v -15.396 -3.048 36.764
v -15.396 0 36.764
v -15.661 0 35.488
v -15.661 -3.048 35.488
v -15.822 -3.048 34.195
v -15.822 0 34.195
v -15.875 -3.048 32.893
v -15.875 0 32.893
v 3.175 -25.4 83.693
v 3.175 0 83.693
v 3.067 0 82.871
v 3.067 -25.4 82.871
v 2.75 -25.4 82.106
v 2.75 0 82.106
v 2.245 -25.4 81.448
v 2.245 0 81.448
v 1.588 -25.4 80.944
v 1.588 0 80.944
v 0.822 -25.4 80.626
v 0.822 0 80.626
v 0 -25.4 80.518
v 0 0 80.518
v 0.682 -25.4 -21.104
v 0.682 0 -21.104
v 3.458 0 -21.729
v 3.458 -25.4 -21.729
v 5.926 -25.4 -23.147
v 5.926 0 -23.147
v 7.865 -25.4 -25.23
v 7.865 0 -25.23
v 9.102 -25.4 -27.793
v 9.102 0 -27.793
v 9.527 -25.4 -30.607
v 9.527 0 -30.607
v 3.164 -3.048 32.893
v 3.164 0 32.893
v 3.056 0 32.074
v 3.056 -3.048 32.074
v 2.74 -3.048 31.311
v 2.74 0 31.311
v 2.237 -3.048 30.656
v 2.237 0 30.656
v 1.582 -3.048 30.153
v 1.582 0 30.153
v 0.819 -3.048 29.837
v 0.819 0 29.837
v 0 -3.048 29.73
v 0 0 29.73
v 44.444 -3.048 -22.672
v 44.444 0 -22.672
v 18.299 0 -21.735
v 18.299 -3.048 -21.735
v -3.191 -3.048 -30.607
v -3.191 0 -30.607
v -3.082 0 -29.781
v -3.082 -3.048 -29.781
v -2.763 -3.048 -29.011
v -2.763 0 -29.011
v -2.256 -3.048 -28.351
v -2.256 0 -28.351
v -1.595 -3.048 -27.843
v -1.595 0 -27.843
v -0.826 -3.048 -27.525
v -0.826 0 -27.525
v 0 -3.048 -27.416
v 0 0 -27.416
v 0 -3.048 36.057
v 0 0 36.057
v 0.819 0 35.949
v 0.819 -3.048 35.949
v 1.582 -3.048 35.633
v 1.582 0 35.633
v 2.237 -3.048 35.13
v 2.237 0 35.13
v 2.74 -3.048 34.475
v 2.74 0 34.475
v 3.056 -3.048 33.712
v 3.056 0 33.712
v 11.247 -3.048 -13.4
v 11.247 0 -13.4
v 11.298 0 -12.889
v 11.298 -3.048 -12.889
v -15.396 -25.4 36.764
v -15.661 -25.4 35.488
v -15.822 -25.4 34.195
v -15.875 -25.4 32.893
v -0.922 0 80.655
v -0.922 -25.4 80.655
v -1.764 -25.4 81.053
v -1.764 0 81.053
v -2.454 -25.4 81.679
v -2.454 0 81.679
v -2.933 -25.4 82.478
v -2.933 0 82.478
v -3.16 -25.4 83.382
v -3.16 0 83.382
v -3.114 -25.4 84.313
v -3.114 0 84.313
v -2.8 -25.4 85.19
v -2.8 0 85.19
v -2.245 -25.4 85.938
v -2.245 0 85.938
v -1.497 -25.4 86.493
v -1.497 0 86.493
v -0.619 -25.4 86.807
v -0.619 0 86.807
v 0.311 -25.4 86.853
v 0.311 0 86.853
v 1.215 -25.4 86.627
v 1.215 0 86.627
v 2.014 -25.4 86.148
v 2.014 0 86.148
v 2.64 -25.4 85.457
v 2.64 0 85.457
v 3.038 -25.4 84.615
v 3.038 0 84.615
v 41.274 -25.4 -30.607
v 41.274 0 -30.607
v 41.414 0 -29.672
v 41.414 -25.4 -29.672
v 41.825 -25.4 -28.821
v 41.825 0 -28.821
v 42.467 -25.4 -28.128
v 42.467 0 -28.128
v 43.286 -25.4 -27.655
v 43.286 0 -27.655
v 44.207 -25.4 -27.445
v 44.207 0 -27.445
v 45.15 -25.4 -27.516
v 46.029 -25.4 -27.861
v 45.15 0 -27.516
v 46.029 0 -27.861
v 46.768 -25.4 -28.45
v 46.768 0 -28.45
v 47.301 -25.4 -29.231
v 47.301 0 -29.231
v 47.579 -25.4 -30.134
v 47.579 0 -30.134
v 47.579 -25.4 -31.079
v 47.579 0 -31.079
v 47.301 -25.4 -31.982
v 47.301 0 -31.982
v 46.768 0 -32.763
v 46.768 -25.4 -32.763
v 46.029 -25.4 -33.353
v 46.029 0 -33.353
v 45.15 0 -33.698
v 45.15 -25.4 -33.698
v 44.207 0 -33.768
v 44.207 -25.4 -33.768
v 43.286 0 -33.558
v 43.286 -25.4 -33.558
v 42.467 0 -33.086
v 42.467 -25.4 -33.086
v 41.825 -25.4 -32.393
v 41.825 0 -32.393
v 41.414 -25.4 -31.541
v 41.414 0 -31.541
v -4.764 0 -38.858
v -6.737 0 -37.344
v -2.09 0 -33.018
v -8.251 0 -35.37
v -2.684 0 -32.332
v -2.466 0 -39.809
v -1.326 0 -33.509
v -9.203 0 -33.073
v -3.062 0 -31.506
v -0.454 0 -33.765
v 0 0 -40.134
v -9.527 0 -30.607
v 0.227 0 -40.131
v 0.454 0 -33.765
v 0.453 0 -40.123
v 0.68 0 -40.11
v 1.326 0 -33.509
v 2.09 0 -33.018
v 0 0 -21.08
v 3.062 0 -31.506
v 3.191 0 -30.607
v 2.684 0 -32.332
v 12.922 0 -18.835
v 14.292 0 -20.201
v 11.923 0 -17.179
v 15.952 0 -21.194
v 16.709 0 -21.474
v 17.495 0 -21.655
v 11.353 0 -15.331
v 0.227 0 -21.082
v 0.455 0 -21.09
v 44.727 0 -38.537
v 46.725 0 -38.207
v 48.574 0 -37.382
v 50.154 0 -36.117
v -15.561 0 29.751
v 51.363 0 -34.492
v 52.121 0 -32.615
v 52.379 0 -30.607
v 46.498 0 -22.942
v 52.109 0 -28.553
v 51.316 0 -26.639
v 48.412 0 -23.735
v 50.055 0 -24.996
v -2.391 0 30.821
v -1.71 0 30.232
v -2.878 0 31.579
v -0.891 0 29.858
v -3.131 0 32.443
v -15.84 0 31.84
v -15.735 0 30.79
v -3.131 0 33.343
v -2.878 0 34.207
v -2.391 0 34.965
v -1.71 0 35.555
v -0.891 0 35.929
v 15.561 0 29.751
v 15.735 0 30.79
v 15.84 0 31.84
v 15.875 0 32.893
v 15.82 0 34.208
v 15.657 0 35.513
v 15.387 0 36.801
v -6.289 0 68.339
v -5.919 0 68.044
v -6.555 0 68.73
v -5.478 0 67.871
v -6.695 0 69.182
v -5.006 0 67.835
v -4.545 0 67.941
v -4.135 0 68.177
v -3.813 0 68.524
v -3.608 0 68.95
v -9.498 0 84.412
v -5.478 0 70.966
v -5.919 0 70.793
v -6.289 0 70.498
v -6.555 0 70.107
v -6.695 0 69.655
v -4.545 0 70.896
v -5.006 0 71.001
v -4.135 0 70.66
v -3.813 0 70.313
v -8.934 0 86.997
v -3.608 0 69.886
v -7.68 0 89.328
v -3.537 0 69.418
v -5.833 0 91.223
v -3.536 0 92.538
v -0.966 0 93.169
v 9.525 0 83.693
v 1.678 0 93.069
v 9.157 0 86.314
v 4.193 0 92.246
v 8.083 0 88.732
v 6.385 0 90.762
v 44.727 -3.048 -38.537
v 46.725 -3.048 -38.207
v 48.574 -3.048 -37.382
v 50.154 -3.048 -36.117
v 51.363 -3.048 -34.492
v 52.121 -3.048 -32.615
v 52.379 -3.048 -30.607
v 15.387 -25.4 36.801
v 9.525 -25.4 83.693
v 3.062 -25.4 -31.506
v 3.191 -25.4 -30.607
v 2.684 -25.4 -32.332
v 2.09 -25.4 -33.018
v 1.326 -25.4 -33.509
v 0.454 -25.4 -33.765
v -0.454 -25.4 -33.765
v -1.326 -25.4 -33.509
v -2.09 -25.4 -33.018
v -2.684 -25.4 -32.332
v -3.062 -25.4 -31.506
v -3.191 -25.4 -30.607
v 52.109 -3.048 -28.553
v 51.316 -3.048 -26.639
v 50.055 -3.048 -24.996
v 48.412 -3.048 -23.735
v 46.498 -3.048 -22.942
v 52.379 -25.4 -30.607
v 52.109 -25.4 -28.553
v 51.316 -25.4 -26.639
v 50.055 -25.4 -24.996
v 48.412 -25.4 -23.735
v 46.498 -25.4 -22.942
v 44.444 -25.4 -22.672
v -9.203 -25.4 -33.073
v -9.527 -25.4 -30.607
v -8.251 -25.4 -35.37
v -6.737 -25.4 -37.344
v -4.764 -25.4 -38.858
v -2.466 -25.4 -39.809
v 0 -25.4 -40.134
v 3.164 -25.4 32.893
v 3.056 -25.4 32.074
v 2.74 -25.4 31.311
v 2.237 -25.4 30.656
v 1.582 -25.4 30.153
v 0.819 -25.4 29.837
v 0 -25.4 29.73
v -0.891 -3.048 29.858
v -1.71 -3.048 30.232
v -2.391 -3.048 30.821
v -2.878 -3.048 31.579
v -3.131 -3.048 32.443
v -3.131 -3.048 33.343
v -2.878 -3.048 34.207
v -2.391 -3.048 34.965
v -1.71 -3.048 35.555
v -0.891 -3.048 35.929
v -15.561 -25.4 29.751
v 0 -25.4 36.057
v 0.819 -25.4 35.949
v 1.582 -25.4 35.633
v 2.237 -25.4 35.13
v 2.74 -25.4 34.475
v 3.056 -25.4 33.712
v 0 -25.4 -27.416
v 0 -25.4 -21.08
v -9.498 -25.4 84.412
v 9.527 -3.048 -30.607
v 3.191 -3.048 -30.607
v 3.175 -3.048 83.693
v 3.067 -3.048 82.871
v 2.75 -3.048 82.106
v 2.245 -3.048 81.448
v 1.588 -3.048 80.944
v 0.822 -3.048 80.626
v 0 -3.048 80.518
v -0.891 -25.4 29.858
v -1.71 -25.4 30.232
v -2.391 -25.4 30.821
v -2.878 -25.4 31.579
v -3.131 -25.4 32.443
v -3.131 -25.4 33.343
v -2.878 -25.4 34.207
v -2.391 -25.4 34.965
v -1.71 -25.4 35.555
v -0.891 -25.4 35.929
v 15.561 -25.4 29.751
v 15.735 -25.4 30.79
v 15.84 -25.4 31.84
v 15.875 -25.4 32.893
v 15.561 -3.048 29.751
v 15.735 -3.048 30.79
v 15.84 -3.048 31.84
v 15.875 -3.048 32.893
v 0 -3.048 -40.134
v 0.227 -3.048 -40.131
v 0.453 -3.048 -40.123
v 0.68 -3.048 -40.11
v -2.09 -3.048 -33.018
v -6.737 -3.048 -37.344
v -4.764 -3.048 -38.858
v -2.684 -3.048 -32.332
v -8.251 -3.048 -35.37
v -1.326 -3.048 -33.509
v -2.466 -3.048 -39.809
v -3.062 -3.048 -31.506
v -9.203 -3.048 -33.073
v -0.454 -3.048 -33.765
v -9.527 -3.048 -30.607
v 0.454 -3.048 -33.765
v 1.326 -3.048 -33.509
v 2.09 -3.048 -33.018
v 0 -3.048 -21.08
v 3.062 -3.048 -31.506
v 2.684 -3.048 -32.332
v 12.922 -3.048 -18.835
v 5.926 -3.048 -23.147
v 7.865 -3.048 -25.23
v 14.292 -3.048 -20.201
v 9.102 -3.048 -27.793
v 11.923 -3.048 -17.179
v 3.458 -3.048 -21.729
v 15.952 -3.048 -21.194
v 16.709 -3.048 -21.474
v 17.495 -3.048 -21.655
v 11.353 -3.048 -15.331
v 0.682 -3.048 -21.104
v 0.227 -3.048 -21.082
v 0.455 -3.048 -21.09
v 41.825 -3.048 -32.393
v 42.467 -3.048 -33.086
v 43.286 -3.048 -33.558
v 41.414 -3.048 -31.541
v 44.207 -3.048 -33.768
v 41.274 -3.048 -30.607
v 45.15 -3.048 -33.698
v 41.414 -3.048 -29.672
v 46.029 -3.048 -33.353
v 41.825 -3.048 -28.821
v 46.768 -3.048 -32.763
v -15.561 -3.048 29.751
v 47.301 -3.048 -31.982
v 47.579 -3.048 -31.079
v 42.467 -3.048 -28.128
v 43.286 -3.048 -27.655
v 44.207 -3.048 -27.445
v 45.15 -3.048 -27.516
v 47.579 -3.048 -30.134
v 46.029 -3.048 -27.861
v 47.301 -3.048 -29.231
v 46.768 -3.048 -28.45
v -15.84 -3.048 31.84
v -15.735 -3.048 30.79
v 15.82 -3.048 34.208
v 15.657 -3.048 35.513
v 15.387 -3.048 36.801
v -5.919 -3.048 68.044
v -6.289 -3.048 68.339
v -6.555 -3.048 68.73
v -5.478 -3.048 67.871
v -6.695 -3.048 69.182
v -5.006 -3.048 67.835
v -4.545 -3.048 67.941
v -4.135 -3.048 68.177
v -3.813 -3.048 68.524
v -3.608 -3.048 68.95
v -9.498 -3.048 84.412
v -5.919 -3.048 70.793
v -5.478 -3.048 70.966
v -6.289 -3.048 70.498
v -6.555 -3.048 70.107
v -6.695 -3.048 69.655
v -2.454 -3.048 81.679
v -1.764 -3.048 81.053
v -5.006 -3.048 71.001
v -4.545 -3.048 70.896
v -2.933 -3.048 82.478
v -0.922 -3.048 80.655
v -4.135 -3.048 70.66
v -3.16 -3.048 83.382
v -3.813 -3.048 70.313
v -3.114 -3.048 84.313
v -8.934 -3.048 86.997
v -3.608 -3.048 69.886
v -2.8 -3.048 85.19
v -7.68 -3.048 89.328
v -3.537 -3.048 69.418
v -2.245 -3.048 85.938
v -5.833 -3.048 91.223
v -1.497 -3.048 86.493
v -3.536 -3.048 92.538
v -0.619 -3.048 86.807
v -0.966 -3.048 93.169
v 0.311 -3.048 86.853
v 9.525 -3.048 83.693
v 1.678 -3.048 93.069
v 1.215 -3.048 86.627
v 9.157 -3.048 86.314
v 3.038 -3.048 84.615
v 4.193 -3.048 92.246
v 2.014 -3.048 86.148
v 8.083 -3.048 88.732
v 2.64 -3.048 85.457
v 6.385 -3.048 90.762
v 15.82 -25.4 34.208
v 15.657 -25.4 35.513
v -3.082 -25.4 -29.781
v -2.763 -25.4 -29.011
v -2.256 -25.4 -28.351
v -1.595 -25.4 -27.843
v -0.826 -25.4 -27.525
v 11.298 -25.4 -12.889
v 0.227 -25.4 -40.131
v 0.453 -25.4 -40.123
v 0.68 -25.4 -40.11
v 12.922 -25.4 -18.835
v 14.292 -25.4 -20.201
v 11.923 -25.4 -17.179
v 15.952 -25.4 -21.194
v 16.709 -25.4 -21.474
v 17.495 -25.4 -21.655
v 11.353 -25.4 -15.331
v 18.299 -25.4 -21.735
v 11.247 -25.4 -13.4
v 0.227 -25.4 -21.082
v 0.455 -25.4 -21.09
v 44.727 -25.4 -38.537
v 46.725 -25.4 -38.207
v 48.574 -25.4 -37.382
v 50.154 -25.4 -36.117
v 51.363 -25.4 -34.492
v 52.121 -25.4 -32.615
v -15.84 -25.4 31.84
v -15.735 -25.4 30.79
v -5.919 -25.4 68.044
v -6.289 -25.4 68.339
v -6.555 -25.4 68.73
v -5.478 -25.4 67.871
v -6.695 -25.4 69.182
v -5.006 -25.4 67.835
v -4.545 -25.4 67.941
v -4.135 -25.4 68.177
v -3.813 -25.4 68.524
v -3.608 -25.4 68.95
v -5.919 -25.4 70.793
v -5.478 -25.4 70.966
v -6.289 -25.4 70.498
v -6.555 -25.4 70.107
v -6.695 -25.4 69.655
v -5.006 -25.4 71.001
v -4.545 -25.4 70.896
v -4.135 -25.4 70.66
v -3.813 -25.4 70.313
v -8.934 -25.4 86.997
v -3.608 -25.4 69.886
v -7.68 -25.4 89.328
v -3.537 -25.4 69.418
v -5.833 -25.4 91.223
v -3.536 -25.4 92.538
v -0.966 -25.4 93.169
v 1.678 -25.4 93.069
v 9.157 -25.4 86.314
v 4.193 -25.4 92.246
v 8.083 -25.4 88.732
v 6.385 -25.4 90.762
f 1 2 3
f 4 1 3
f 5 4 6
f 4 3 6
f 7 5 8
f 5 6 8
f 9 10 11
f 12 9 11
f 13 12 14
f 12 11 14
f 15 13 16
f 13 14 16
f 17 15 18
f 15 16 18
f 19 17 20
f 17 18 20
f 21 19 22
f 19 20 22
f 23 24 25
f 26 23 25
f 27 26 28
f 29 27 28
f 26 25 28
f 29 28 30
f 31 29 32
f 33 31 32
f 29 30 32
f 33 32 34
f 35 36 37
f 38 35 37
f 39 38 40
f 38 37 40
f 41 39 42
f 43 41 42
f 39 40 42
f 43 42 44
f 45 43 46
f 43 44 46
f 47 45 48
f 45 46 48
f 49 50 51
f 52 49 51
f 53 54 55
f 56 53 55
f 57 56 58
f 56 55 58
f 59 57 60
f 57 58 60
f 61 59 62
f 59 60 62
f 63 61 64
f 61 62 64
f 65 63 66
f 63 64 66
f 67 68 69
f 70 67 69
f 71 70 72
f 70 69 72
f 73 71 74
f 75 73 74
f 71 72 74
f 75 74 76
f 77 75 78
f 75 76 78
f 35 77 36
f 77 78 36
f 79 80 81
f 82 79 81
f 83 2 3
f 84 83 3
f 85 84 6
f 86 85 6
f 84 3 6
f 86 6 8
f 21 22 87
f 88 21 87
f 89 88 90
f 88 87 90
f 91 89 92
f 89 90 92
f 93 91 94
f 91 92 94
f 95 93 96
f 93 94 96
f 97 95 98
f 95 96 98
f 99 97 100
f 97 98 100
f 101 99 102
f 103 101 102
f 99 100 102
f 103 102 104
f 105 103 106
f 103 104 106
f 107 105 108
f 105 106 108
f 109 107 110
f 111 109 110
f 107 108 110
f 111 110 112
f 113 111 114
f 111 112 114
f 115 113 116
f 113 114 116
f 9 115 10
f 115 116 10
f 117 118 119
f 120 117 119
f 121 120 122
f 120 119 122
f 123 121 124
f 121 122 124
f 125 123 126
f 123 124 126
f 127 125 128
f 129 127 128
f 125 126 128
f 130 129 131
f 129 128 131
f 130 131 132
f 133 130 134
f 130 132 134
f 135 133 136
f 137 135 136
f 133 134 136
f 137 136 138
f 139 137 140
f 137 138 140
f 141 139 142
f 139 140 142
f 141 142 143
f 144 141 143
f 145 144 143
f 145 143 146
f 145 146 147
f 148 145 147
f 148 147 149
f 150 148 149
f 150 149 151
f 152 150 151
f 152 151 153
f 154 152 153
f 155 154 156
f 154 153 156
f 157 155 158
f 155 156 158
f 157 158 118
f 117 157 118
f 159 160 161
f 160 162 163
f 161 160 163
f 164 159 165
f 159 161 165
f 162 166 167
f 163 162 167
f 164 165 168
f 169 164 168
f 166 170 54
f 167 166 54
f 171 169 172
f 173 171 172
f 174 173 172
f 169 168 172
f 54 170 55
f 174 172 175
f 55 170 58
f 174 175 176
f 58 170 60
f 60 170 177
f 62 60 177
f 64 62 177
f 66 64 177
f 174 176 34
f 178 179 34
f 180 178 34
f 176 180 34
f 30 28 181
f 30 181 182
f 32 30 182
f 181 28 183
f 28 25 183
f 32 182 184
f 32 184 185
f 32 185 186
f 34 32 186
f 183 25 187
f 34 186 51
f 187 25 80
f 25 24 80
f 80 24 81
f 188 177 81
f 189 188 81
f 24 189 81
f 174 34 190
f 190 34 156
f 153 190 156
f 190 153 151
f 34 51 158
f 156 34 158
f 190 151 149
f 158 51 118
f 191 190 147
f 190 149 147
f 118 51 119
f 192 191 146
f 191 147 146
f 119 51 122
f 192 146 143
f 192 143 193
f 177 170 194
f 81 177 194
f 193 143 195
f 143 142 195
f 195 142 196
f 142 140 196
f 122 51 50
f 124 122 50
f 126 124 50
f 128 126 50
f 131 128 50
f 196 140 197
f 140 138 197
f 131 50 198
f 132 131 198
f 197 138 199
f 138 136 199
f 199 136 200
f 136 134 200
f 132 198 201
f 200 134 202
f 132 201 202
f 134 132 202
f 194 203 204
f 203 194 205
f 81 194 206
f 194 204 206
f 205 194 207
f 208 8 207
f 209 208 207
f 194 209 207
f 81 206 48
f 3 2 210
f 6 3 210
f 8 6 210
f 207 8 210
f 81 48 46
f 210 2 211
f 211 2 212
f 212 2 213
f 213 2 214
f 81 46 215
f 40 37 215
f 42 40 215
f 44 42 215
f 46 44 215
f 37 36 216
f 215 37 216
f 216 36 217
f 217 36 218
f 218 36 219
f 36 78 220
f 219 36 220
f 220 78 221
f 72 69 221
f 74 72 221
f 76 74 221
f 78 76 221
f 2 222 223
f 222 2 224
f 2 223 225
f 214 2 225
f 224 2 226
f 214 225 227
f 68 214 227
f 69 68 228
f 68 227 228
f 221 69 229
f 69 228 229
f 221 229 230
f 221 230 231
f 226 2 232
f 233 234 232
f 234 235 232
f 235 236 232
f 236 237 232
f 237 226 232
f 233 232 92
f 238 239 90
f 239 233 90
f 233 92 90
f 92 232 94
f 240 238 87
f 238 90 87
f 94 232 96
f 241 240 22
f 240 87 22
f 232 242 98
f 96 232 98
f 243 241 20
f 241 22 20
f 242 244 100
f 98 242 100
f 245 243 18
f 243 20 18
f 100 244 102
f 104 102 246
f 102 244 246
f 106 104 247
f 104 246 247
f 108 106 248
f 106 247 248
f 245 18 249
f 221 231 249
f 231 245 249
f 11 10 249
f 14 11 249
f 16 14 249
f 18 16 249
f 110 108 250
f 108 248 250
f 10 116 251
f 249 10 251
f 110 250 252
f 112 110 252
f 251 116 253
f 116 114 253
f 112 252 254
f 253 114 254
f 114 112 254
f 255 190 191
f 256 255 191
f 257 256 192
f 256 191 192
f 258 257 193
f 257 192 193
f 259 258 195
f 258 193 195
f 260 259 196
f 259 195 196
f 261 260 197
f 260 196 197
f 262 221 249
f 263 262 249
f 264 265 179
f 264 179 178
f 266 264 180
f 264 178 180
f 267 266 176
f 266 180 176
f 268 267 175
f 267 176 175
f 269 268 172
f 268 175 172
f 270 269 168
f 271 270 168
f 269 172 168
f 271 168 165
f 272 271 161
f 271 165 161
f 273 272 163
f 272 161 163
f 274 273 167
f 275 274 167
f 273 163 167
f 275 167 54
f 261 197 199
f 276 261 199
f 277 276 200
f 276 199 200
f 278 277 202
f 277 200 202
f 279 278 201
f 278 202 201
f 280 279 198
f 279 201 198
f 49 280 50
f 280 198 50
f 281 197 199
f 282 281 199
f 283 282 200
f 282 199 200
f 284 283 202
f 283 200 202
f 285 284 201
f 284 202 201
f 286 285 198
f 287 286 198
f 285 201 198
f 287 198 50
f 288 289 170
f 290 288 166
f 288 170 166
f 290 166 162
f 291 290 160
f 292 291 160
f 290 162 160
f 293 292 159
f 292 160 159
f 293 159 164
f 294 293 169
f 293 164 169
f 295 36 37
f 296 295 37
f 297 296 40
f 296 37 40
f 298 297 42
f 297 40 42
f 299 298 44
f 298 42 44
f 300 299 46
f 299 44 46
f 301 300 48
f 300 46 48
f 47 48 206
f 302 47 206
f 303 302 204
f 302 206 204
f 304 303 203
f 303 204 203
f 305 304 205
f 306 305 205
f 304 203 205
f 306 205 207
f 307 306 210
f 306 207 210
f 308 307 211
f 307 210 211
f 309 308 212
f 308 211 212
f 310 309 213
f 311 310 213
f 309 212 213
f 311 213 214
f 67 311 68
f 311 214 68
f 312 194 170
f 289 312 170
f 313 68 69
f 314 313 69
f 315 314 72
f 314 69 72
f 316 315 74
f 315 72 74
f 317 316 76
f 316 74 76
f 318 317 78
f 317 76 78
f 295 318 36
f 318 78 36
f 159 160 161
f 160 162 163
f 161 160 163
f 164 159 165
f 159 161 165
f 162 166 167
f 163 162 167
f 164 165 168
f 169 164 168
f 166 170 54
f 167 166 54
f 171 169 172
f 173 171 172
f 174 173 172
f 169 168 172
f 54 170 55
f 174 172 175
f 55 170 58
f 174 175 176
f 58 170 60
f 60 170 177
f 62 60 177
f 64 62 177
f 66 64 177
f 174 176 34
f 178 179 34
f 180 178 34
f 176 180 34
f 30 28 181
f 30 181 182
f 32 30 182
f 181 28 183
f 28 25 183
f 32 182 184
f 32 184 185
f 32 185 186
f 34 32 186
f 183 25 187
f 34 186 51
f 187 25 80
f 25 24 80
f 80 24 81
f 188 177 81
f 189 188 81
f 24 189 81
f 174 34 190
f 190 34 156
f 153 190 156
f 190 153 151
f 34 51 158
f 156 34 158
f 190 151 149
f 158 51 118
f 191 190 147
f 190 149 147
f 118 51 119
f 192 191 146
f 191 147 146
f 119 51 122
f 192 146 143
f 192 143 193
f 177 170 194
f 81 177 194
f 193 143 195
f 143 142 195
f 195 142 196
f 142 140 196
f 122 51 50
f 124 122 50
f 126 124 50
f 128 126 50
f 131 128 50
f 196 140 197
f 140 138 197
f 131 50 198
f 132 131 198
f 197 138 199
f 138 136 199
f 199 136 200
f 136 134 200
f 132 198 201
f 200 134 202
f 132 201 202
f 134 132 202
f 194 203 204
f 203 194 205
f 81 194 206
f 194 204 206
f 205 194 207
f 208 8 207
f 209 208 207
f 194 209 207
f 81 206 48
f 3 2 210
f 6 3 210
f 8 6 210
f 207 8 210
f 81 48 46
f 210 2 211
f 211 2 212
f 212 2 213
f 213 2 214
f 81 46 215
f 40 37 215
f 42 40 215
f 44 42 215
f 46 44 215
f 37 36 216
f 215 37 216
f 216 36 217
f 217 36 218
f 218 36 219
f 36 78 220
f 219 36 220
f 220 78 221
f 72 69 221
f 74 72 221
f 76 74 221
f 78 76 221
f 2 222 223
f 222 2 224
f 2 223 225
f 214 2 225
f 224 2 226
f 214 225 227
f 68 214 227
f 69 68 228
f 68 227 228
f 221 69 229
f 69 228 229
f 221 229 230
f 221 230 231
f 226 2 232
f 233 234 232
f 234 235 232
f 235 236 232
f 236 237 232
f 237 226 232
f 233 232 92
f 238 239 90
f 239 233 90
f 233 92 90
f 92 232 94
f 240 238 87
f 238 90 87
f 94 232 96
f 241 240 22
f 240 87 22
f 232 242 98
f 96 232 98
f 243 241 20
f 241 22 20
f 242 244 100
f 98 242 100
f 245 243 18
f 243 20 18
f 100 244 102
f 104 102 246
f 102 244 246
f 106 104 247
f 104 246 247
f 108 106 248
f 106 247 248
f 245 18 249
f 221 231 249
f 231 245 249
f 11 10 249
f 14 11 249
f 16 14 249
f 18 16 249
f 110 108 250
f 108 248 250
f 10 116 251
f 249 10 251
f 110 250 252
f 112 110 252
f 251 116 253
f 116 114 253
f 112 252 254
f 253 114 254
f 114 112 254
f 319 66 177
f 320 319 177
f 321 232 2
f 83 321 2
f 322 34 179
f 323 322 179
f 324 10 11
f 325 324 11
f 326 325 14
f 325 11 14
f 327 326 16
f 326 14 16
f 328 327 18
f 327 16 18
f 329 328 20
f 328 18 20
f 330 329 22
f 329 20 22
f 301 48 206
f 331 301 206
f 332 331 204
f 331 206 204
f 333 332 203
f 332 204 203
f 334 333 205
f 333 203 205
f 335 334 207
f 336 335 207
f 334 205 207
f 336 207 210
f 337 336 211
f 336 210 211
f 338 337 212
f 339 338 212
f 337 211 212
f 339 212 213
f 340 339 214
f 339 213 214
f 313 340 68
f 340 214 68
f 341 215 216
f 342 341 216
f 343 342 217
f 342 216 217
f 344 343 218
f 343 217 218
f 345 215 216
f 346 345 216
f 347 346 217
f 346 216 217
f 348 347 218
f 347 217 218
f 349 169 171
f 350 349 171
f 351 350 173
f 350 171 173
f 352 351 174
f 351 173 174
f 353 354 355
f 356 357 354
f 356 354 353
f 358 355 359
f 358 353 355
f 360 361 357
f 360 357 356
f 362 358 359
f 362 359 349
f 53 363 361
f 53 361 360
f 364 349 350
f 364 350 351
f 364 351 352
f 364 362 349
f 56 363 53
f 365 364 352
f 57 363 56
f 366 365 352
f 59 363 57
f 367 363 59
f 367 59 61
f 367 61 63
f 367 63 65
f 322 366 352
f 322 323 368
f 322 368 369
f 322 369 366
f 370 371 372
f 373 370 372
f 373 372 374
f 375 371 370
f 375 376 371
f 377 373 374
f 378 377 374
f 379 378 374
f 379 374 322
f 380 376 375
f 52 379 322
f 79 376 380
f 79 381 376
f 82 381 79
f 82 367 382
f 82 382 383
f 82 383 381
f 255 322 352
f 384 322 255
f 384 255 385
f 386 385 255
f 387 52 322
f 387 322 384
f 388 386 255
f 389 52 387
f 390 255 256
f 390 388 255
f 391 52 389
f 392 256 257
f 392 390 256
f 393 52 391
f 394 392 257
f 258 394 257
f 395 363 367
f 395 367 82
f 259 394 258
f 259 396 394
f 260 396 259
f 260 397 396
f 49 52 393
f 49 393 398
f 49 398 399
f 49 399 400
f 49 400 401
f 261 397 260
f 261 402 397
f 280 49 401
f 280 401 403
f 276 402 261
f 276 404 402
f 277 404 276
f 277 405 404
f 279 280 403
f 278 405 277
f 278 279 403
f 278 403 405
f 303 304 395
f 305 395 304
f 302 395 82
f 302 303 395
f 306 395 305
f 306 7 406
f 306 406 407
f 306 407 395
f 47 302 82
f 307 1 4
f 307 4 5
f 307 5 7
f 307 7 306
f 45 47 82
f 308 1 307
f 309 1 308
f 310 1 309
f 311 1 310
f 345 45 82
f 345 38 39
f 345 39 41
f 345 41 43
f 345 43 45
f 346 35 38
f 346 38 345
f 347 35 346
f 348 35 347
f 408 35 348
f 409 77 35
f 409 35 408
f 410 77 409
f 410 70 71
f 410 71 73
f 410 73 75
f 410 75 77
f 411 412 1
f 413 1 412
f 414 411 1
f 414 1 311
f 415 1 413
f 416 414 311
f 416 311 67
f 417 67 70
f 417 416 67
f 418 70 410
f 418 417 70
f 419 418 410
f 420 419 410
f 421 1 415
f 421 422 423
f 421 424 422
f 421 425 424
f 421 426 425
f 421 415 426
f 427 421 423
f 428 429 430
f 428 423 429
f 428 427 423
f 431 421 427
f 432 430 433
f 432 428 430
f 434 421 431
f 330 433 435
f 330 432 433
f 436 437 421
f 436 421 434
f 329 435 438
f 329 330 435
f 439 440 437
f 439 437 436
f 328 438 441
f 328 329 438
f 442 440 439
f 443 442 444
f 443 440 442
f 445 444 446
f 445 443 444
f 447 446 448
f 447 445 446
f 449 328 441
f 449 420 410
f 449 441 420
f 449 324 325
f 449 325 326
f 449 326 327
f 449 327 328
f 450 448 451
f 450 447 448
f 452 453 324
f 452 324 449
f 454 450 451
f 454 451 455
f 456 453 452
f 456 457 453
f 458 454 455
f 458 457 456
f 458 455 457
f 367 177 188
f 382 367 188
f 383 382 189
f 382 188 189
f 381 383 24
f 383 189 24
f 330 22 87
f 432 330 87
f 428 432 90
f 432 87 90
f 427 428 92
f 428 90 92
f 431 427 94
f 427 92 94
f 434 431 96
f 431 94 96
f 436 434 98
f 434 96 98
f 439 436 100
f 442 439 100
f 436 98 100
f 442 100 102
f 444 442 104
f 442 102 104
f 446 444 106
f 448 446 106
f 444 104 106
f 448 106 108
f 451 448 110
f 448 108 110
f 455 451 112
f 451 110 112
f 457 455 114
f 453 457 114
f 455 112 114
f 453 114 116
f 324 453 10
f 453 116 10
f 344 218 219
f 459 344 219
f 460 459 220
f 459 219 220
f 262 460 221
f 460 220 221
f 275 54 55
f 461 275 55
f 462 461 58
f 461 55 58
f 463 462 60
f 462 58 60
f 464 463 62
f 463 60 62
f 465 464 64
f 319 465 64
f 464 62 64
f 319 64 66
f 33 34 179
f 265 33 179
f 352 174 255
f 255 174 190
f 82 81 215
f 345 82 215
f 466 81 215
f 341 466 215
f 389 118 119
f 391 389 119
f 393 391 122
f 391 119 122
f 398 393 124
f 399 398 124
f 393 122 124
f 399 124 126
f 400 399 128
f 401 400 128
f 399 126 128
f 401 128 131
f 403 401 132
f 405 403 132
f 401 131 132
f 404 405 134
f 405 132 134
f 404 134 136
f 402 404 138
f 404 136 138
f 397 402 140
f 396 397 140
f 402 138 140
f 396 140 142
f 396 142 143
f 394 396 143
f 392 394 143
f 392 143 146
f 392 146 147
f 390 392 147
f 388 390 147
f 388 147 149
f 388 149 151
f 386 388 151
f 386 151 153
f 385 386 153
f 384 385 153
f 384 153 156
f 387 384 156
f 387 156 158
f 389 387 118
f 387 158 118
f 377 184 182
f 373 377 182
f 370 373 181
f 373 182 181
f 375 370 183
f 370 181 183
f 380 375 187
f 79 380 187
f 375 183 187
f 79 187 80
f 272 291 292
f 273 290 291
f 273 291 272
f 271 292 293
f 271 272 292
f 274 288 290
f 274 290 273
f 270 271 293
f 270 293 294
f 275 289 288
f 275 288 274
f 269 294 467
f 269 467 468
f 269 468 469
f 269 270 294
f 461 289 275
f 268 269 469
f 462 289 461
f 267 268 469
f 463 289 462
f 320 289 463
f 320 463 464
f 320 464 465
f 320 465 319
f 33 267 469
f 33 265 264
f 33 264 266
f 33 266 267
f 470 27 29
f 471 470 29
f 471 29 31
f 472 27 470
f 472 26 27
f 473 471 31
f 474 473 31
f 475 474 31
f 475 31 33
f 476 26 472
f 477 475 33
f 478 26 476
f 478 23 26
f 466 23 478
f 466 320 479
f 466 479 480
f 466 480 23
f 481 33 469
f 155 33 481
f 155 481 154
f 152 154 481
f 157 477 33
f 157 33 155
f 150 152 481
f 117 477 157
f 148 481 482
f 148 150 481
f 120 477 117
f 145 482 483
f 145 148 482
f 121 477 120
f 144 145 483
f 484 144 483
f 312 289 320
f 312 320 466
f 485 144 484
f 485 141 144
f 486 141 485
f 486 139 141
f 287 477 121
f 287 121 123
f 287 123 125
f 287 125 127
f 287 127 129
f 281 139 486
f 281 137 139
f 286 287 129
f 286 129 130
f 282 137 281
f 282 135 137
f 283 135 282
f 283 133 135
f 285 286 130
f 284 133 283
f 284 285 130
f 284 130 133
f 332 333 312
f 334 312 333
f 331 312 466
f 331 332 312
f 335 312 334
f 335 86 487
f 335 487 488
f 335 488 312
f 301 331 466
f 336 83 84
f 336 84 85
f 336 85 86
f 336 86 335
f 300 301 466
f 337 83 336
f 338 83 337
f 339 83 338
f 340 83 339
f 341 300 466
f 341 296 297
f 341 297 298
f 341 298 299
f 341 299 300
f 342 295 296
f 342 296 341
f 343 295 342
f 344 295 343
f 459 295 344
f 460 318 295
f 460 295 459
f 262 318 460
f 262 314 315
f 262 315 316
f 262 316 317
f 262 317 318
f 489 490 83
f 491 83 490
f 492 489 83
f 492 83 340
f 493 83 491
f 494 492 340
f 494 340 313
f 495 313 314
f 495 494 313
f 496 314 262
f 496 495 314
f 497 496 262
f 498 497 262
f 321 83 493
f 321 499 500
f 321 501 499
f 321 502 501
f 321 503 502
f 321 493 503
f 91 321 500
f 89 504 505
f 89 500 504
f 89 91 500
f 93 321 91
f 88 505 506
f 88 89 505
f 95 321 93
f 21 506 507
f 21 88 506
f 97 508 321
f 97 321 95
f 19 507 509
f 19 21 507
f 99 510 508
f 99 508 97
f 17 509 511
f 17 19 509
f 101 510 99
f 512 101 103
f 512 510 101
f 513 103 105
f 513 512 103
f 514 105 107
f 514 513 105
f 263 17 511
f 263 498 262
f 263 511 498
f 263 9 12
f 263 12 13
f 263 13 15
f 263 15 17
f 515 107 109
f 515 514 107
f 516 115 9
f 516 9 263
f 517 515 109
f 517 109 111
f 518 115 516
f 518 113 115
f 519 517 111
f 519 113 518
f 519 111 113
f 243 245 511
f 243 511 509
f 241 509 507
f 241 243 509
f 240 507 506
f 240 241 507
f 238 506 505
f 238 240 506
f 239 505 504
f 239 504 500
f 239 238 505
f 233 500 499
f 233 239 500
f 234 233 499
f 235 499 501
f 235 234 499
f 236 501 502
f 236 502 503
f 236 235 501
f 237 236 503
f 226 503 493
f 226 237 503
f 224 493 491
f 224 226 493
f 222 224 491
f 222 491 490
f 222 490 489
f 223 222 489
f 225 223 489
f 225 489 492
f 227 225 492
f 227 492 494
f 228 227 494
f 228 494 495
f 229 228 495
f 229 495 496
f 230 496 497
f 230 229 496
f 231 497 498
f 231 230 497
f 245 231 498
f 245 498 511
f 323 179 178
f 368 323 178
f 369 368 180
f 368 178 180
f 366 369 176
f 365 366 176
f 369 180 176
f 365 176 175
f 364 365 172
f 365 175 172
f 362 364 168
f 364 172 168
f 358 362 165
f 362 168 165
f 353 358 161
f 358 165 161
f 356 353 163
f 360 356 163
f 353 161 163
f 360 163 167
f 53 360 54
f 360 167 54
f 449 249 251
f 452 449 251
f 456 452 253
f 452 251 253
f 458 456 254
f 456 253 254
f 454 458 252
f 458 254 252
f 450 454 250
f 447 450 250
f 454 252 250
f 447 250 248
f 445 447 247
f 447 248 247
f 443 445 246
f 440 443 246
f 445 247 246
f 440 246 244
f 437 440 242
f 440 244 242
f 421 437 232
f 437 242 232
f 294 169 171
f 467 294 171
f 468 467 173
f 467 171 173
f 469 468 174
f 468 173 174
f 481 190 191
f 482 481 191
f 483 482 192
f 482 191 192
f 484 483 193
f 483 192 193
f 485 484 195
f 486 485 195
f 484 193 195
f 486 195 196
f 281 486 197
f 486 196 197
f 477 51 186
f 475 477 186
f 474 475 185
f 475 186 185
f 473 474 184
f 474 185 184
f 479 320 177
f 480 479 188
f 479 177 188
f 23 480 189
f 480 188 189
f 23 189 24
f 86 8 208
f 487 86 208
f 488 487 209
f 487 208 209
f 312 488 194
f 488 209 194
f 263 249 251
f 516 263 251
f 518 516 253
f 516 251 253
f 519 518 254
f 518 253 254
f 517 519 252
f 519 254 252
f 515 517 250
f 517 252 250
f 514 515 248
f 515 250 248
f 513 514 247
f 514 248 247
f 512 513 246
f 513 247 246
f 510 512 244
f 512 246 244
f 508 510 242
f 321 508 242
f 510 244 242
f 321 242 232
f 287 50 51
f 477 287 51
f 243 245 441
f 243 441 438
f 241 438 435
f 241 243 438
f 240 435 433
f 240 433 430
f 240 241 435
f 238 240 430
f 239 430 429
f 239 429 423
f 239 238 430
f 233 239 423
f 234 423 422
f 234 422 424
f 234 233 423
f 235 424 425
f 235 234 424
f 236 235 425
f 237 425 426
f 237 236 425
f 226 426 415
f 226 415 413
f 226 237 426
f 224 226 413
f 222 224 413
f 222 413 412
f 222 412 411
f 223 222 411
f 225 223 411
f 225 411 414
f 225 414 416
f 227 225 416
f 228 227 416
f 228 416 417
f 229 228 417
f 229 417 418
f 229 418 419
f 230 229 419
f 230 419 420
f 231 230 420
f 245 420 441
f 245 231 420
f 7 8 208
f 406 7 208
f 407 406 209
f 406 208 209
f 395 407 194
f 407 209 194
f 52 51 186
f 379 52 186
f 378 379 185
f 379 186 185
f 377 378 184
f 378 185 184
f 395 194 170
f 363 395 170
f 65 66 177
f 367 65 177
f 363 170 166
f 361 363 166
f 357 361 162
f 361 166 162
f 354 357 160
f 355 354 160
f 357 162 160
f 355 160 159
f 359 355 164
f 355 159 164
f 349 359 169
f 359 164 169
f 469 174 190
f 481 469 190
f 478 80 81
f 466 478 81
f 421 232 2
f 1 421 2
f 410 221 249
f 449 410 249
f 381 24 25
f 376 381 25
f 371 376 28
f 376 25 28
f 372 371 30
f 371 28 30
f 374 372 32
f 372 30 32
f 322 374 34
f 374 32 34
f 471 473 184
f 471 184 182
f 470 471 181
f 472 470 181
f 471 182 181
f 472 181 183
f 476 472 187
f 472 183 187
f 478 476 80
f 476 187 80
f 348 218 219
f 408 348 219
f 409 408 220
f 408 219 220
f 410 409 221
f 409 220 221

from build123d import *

# Parameters (mm, degrees)
F0_R     = 1.5875
F1_DEPTH = 25.4
F2_DEPTH = 3.048


with BuildPart() as f1:
    # F0 (on Front) → F1 (new body)
    with BuildSketch(Plane.XZ):
        with BuildLine():
            ThreePointArc((-9.4978428488, 84.4119633965), (-6.9846885975, 77.2171194998), (0, 74.1682101567))
            ThreePointArc((0, 74.1682101567), (6.7351920908, 76.9580180659), (9.525, 83.6932101567))
            ThreePointArc((9.525, 83.6932101567), (0.3596330528, 93.2114184475), (-9.4978428488, 84.4119633965))
        make_face()
        with BuildLine():
            ThreePointArc((3.175, 83.6932101567), (2.2450640303, 81.4481461264), (0, 80.5182101567))
            ThreePointArc((0, 80.5182101567), (-2.2450640303, 85.938274187), (3.175, 83.6932101567))
        make_face(mode=Mode.SUBTRACT)
        with BuildLine():
            ThreePointArc((9.525, 83.6932101567), (6.7351920908, 76.9580180659), (0, 74.1682101567))
            Line((0, 74.1682101567), (0, 69.4184101567))
            Line((0, 69.4184101567), (0, 48.7682101567))
            ThreePointArc((0, 48.7682101567), (9.7463072395, 45.4241766075), (15.3865384615, 36.8009024644))
            Line((15.3865384615, 36.8009024644), (9.525, 83.6932101567))
        make_face()
        with BuildLine():
            Line((0, 69.4184101567), (0, 74.1682101567))
            ThreePointArc((0, 74.1682101567), (-6.9846885975, 77.2171194998), (-9.4978428488, 84.4119633965))
            Line((-9.4978428488, 84.4119633965), (-15.3958589716, 36.7640177631))
            ThreePointArc((-15.3958589716, 36.7640177631), (-9.7613153378, 45.4124892045), (0, 48.7682101567))
            Line((0, 48.7682101567), (0, 69.4184101567))
        make_face()
        with Locations((-5.124937529, 69.4184101567)):
            Circle(F0_R, mode=Mode.SUBTRACT)
        with BuildLine():
            ThreePointArc((15.3865384615, 36.8009024644), (9.7463072395, 45.4241766075), (0, 48.7682101567))
            Line((0, 48.7682101567), (0, 36.0568941846))
            ThreePointArc((0, 36.0568941846), (2.2370624297, 35.1302725864), (3.1636840279, 32.8932101567))
            ThreePointArc((3.1636840279, 32.8932101567), (2.2370624297, 30.656147727), (0, 29.7295261288))
            Line((0, 29.7295261288), (0, 17.0182101567))
            ThreePointArc((0, 17.0182101567), (10.0530630624, 20.6069760688), (15.5608549399, 29.7506922904))
            Line((15.5608549399, 29.7506922904), (15.875, 32.8932101567))
            Line((15.875, 32.8932101567), (15.3865384615, 36.8009024644))
        make_face()
        with BuildLine():
            Line((0, 36.0568941846), (0, 48.7682101567))
            ThreePointArc((0, 48.7682101567), (-9.7613153378, 45.4124892045), (-15.3958589716, 36.7640177631))
            Line((-15.3958589716, 36.7640177631), (-15.875, 32.8932101567))
            Line((-15.875, 32.8932101567), (-15.5608549399, 29.7506922904))
            ThreePointArc((-15.5608549399, 29.7506922904), (-10.0530630624, 20.6069760688), (0, 17.0182101567))
            Line((0, 17.0182101567), (0, 29.7295261288))
            ThreePointArc((0, 29.7295261288), (-3.1636840279, 32.8932101567), (0, 36.0568941846))
        make_face()
        with BuildLine():
            Line((-15.875, 32.8932101567), (-15.3958589716, 36.7640177631))
            ThreePointArc((-15.3958589716, 36.7640177631), (-15.7547593789, 34.8433849983), (-15.875, 32.8932101567))
        make_face()
        with BuildLine():
            ThreePointArc((15.875, 32.8932101567), (15.7524112928, 34.8622615683), (15.3865384615, 36.8009024644))
            Line((15.3865384615, 36.8009024644), (15.875, 32.8932101567))
        make_face()
        with BuildLine():
            Line((-15.5608549399, 29.7506922904), (-15.875, 32.8932101567))
            ThreePointArc((-15.875, 32.8932101567), (-15.7962685019, 31.314119781), (-15.5608549399, 29.7506922904))
        make_face()
        with BuildLine():
            ThreePointArc((15.5608549399, 29.7506922904), (15.7962685019, 31.314119781), (15.875, 32.8932101567))
            Line((15.875, 32.8932101567), (15.5608549399, 29.7506922904))
        make_face()
        with BuildLine():
            ThreePointArc((0, 17.0182101567), (-10.0530630624, 20.6069760688), (-15.5608549399, 29.7506922904))
            Line((-15.5608549399, 29.7506922904), (-9.5271565935, -30.6067898433))
            ThreePointArc((-9.5271565935, -30.6067898433), (-6.7367170327, -23.8700728106), (0, -21.0796332498))
            Line((0, -21.0796332498), (0, 17.0182101567))
        make_face()
        with BuildLine():
            Line((11.2983400626, -12.8889377975), (15.5608549399, 29.7506922904))
            ThreePointArc((15.5608549399, 29.7506922904), (10.0530630624, 20.6069760688), (0, 17.0182101567))
            Line((0, 17.0182101567), (0, -21.0796332498))
            ThreePointArc((0, -21.0796332498), (0.3410737199, -21.085740454), (0.6817101619, -21.1040542366))
            ThreePointArc((0.6817101619, -21.1040542366), (6.9735741274, -24.1155667963), (9.5271565935, -30.6067898433))
            Line((9.5271565935, -30.6067898433), (36.5091171516, -30.6067898433))
            ThreePointArc((36.5091171516, -30.6067898433), (38.8332331942, -24.9958773728), (44.4441456647, -22.6717613302))
            Line((44.4441456647, -22.6717613302), (18.2985487274, -21.7351444049))
            ThreePointArc((18.2985487274, -21.7351444049), (17.0992487454, -21.5768820426), (15.9517234628, -21.1940594363))
            ThreePointArc((15.9517234628, -21.1940594363), (12.3718358169, -18.037938808), (11.2472680533, -13.3998314005))
            ThreePointArc((11.2472680533, -13.3998314005), (11.2686743647, -13.14397177), (11.2983400626, -12.8889377975))
        make_face()
        with BuildLine():
            Line((-3.1908159444, -30.6067898433), (-9.5271565935, -30.6067898433))
            ThreePointArc((-9.5271565935, -30.6067898433), (-6.7367170327, -37.343506876), (0, -40.1339464368))
            Line((0, -40.1339464368), (0.6795501516, -40.1096801588))
            ThreePointArc((0.6795501516, -40.1096801588), (6.9728363477, -37.0988054028), (9.5271565935, -30.6067898433))
            Line((9.5271565935, -30.6067898433), (3.1908159444, -30.6067898433))
            ThreePointArc((3.1908159444, -30.6067898433), (0, -33.7976057877), (-3.1908159444, -30.6067898433))
        make_face()
        with BuildLine():
            ThreePointArc((0, -21.0796332498), (-6.7367170327, -23.8700728106), (-9.5271565935, -30.6067898433))
            Line((-9.5271565935, -30.6067898433), (-3.1908159444, -30.6067898433))
            ThreePointArc((-3.1908159444, -30.6067898433), (-2.2562475918, -28.3505422515), (0, -27.4159738989))
            Line((0, -27.4159738989), (0, -21.0796332498))
        make_face()
        with BuildLine():
            Line((11.2472680533, -13.3998314005), (11.2983400626, -12.8889377975))
            ThreePointArc((11.2983400626, -12.8889377975), (11.2686743647, -13.14397177), (11.2472680533, -13.3998314005))
        make_face()
        with BuildLine():
            Line((0.6795501516, -40.1096801588), (0, -40.1339464368))
            ThreePointArc((0, -40.1339464368), (0.3399916399, -40.1278779346), (0.6795501516, -40.1096801588))
        make_face()
        with BuildLine():
            ThreePointArc((9.5271565935, -30.6067898433), (6.9728363477, -37.0988054028), (0.6795501516, -40.1096801588))
            Line((0.6795501516, -40.1096801588), (44.7273196978, -38.5367639902))
            ThreePointArc((44.7273196978, -38.5367639902), (38.9342598457, -36.3169418348), (36.5091171516, -30.6067898433))
            Line((36.5091171516, -30.6067898433), (9.5271565935, -30.6067898433))
        make_face()
        with BuildLine():
            ThreePointArc((36.5091171516, -30.6067898433), (38.9342598457, -36.3169418348), (44.7273196978, -38.5367639902))
            ThreePointArc((44.7273196978, -38.5367639902), (50.1542976561, -36.1166756623), (52.3791741778, -30.6067898433))
            ThreePointArc((52.3791741778, -30.6067898433), (50.0550581352, -24.9958773728), (44.4441456647, -22.6717613302))
            ThreePointArc((44.4441456647, -22.6717613302), (38.8332331942, -24.9958773728), (36.5091171516, -30.6067898433))
        make_face()
        with BuildLine():
            ThreePointArc((47.6147016308, -30.6067898433), (44.4441456647, -33.7773458094), (41.2735896986, -30.6067898433))
            ThreePointArc((41.2735896986, -30.6067898433), (44.4441456647, -27.4362338772), (47.6147016308, -30.6067898433))
        make_face(mode=Mode.SUBTRACT)
    extrude(amount=F1_DEPTH)


with BuildPart() as f2:
    # F0 (on Front) → F2 (new body)
    with BuildSketch(Plane.XZ):
        with BuildLine():
            ThreePointArc((-9.4978428488, 84.4119633965), (-6.9846885975, 77.2171194998), (0, 74.1682101567))
            ThreePointArc((0, 74.1682101567), (6.7351920908, 76.9580180659), (9.525, 83.6932101567))
            ThreePointArc((9.525, 83.6932101567), (0.3596330528, 93.2114184475), (-9.4978428488, 84.4119633965))
        make_face()
        with BuildLine():
            ThreePointArc((3.175, 83.6932101567), (2.2450640303, 81.4481461264), (0, 80.5182101567))
            ThreePointArc((0, 80.5182101567), (-2.2450640303, 85.938274187), (3.175, 83.6932101567))
        make_face(mode=Mode.SUBTRACT)
        with BuildLine():
            ThreePointArc((9.525, 83.6932101567), (6.7351920908, 76.9580180659), (0, 74.1682101567))
            Line((0, 74.1682101567), (0, 69.4184101567))
            Line((0, 69.4184101567), (0, 48.7682101567))
            ThreePointArc((0, 48.7682101567), (9.7463072395, 45.4241766075), (15.3865384615, 36.8009024644))
            Line((15.3865384615, 36.8009024644), (9.525, 83.6932101567))
        make_face()
        with BuildLine():
            Line((0, 69.4184101567), (0, 74.1682101567))
            ThreePointArc((0, 74.1682101567), (-6.9846885975, 77.2171194998), (-9.4978428488, 84.4119633965))
            Line((-9.4978428488, 84.4119633965), (-15.3958589716, 36.7640177631))
            ThreePointArc((-15.3958589716, 36.7640177631), (-9.7613153378, 45.4124892045), (0, 48.7682101567))
            Line((0, 48.7682101567), (0, 69.4184101567))
        make_face()
        with Locations((-5.124937529, 69.4184101567)):
            Circle(F0_R, mode=Mode.SUBTRACT)
        with BuildLine():
            ThreePointArc((15.3865384615, 36.8009024644), (9.7463072395, 45.4241766075), (0, 48.7682101567))
            Line((0, 48.7682101567), (0, 36.0568941846))
            ThreePointArc((0, 36.0568941846), (2.2370624297, 35.1302725864), (3.1636840279, 32.8932101567))
            ThreePointArc((3.1636840279, 32.8932101567), (2.2370624297, 30.656147727), (0, 29.7295261288))
            Line((0, 29.7295261288), (0, 17.0182101567))
            ThreePointArc((0, 17.0182101567), (10.0530630624, 20.6069760688), (15.5608549399, 29.7506922904))
            Line((15.5608549399, 29.7506922904), (15.875, 32.8932101567))
            Line((15.875, 32.8932101567), (15.3865384615, 36.8009024644))
        make_face()
        with BuildLine():
            Line((0, 36.0568941846), (0, 48.7682101567))
            ThreePointArc((0, 48.7682101567), (-9.7613153378, 45.4124892045), (-15.3958589716, 36.7640177631))
            Line((-15.3958589716, 36.7640177631), (-15.875, 32.8932101567))
            Line((-15.875, 32.8932101567), (-15.5608549399, 29.7506922904))
            ThreePointArc((-15.5608549399, 29.7506922904), (-10.0530630624, 20.6069760688), (0, 17.0182101567))
            Line((0, 17.0182101567), (0, 29.7295261288))
            ThreePointArc((0, 29.7295261288), (-3.1636840279, 32.8932101567), (0, 36.0568941846))
        make_face()
        with BuildLine():
            Line((-15.875, 32.8932101567), (-15.3958589716, 36.7640177631))
            ThreePointArc((-15.3958589716, 36.7640177631), (-15.7547593789, 34.8433849983), (-15.875, 32.8932101567))
        make_face()
        with BuildLine():
            ThreePointArc((15.875, 32.8932101567), (15.7524112928, 34.8622615683), (15.3865384615, 36.8009024644))
            Line((15.3865384615, 36.8009024644), (15.875, 32.8932101567))
        make_face()
        with BuildLine():
            Line((-15.5608549399, 29.7506922904), (-15.875, 32.8932101567))
            ThreePointArc((-15.875, 32.8932101567), (-15.7962685019, 31.314119781), (-15.5608549399, 29.7506922904))
        make_face()
        with BuildLine():
            ThreePointArc((15.5608549399, 29.7506922904), (15.7962685019, 31.314119781), (15.875, 32.8932101567))
            Line((15.875, 32.8932101567), (15.5608549399, 29.7506922904))
        make_face()
        with BuildLine():
            ThreePointArc((0, 17.0182101567), (-10.0530630624, 20.6069760688), (-15.5608549399, 29.7506922904))
            Line((-15.5608549399, 29.7506922904), (-9.5271565935, -30.6067898433))
            ThreePointArc((-9.5271565935, -30.6067898433), (-6.7367170327, -23.8700728106), (0, -21.0796332498))
            Line((0, -21.0796332498), (0, 17.0182101567))
        make_face()
        with BuildLine():
            Line((11.2983400626, -12.8889377975), (15.5608549399, 29.7506922904))
            ThreePointArc((15.5608549399, 29.7506922904), (10.0530630624, 20.6069760688), (0, 17.0182101567))
            Line((0, 17.0182101567), (0, -21.0796332498))
            ThreePointArc((0, -21.0796332498), (0.3410737199, -21.085740454), (0.6817101619, -21.1040542366))
            ThreePointArc((0.6817101619, -21.1040542366), (6.9735741274, -24.1155667963), (9.5271565935, -30.6067898433))
            Line((9.5271565935, -30.6067898433), (36.5091171516, -30.6067898433))
            ThreePointArc((36.5091171516, -30.6067898433), (38.8332331942, -24.9958773728), (44.4441456647, -22.6717613302))
            Line((44.4441456647, -22.6717613302), (18.2985487274, -21.7351444049))
            ThreePointArc((18.2985487274, -21.7351444049), (17.0992487454, -21.5768820426), (15.9517234628, -21.1940594363))
            ThreePointArc((15.9517234628, -21.1940594363), (12.3718358169, -18.037938808), (11.2472680533, -13.3998314005))
            ThreePointArc((11.2472680533, -13.3998314005), (11.2686743647, -13.14397177), (11.2983400626, -12.8889377975))
        make_face()
        with BuildLine():
            Line((-3.1908159444, -30.6067898433), (-9.5271565935, -30.6067898433))
            ThreePointArc((-9.5271565935, -30.6067898433), (-6.7367170327, -37.343506876), (0, -40.1339464368))
            Line((0, -40.1339464368), (0.6795501516, -40.1096801588))
            ThreePointArc((0.6795501516, -40.1096801588), (6.9728363477, -37.0988054028), (9.5271565935, -30.6067898433))
            Line((9.5271565935, -30.6067898433), (3.1908159444, -30.6067898433))
            ThreePointArc((3.1908159444, -30.6067898433), (0, -33.7976057877), (-3.1908159444, -30.6067898433))
        make_face()
        with BuildLine():
            ThreePointArc((0, -21.0796332498), (-6.7367170327, -23.8700728106), (-9.5271565935, -30.6067898433))
            Line((-9.5271565935, -30.6067898433), (-3.1908159444, -30.6067898433))
            ThreePointArc((-3.1908159444, -30.6067898433), (-2.2562475918, -28.3505422515), (0, -27.4159738989))
            Line((0, -27.4159738989), (0, -21.0796332498))
        make_face()
        with BuildLine():
            Line((11.2472680533, -13.3998314005), (11.2983400626, -12.8889377975))
            ThreePointArc((11.2983400626, -12.8889377975), (11.2686743647, -13.14397177), (11.2472680533, -13.3998314005))
        make_face()
        with BuildLine():
            Line((0.6795501516, -40.1096801588), (0, -40.1339464368))
            ThreePointArc((0, -40.1339464368), (0.3399916399, -40.1278779346), (0.6795501516, -40.1096801588))
        make_face()
        with BuildLine():
            ThreePointArc((9.5271565935, -30.6067898433), (6.9728363477, -37.0988054028), (0.6795501516, -40.1096801588))
            Line((0.6795501516, -40.1096801588), (44.7273196978, -38.5367639902))
            ThreePointArc((44.7273196978, -38.5367639902), (38.9342598457, -36.3169418348), (36.5091171516, -30.6067898433))
            Line((36.5091171516, -30.6067898433), (9.5271565935, -30.6067898433))
        make_face()
        with BuildLine():
            ThreePointArc((36.5091171516, -30.6067898433), (38.9342598457, -36.3169418348), (44.7273196978, -38.5367639902))
            ThreePointArc((44.7273196978, -38.5367639902), (50.1542976561, -36.1166756623), (52.3791741778, -30.6067898433))
            ThreePointArc((52.3791741778, -30.6067898433), (50.0550581352, -24.9958773728), (44.4441456647, -22.6717613302))
            ThreePointArc((44.4441456647, -22.6717613302), (38.8332331942, -24.9958773728), (36.5091171516, -30.6067898433))
        make_face()
        with BuildLine():
            ThreePointArc((47.6147016308, -30.6067898433), (44.4441456647, -33.7773458094), (41.2735896986, -30.6067898433))
            ThreePointArc((41.2735896986, -30.6067898433), (44.4441456647, -27.4362338772), (47.6147016308, -30.6067898433))
        make_face(mode=Mode.SUBTRACT)
    extrude(amount=F2_DEPTH)


solid = Compound([f1.part, f2.part])
